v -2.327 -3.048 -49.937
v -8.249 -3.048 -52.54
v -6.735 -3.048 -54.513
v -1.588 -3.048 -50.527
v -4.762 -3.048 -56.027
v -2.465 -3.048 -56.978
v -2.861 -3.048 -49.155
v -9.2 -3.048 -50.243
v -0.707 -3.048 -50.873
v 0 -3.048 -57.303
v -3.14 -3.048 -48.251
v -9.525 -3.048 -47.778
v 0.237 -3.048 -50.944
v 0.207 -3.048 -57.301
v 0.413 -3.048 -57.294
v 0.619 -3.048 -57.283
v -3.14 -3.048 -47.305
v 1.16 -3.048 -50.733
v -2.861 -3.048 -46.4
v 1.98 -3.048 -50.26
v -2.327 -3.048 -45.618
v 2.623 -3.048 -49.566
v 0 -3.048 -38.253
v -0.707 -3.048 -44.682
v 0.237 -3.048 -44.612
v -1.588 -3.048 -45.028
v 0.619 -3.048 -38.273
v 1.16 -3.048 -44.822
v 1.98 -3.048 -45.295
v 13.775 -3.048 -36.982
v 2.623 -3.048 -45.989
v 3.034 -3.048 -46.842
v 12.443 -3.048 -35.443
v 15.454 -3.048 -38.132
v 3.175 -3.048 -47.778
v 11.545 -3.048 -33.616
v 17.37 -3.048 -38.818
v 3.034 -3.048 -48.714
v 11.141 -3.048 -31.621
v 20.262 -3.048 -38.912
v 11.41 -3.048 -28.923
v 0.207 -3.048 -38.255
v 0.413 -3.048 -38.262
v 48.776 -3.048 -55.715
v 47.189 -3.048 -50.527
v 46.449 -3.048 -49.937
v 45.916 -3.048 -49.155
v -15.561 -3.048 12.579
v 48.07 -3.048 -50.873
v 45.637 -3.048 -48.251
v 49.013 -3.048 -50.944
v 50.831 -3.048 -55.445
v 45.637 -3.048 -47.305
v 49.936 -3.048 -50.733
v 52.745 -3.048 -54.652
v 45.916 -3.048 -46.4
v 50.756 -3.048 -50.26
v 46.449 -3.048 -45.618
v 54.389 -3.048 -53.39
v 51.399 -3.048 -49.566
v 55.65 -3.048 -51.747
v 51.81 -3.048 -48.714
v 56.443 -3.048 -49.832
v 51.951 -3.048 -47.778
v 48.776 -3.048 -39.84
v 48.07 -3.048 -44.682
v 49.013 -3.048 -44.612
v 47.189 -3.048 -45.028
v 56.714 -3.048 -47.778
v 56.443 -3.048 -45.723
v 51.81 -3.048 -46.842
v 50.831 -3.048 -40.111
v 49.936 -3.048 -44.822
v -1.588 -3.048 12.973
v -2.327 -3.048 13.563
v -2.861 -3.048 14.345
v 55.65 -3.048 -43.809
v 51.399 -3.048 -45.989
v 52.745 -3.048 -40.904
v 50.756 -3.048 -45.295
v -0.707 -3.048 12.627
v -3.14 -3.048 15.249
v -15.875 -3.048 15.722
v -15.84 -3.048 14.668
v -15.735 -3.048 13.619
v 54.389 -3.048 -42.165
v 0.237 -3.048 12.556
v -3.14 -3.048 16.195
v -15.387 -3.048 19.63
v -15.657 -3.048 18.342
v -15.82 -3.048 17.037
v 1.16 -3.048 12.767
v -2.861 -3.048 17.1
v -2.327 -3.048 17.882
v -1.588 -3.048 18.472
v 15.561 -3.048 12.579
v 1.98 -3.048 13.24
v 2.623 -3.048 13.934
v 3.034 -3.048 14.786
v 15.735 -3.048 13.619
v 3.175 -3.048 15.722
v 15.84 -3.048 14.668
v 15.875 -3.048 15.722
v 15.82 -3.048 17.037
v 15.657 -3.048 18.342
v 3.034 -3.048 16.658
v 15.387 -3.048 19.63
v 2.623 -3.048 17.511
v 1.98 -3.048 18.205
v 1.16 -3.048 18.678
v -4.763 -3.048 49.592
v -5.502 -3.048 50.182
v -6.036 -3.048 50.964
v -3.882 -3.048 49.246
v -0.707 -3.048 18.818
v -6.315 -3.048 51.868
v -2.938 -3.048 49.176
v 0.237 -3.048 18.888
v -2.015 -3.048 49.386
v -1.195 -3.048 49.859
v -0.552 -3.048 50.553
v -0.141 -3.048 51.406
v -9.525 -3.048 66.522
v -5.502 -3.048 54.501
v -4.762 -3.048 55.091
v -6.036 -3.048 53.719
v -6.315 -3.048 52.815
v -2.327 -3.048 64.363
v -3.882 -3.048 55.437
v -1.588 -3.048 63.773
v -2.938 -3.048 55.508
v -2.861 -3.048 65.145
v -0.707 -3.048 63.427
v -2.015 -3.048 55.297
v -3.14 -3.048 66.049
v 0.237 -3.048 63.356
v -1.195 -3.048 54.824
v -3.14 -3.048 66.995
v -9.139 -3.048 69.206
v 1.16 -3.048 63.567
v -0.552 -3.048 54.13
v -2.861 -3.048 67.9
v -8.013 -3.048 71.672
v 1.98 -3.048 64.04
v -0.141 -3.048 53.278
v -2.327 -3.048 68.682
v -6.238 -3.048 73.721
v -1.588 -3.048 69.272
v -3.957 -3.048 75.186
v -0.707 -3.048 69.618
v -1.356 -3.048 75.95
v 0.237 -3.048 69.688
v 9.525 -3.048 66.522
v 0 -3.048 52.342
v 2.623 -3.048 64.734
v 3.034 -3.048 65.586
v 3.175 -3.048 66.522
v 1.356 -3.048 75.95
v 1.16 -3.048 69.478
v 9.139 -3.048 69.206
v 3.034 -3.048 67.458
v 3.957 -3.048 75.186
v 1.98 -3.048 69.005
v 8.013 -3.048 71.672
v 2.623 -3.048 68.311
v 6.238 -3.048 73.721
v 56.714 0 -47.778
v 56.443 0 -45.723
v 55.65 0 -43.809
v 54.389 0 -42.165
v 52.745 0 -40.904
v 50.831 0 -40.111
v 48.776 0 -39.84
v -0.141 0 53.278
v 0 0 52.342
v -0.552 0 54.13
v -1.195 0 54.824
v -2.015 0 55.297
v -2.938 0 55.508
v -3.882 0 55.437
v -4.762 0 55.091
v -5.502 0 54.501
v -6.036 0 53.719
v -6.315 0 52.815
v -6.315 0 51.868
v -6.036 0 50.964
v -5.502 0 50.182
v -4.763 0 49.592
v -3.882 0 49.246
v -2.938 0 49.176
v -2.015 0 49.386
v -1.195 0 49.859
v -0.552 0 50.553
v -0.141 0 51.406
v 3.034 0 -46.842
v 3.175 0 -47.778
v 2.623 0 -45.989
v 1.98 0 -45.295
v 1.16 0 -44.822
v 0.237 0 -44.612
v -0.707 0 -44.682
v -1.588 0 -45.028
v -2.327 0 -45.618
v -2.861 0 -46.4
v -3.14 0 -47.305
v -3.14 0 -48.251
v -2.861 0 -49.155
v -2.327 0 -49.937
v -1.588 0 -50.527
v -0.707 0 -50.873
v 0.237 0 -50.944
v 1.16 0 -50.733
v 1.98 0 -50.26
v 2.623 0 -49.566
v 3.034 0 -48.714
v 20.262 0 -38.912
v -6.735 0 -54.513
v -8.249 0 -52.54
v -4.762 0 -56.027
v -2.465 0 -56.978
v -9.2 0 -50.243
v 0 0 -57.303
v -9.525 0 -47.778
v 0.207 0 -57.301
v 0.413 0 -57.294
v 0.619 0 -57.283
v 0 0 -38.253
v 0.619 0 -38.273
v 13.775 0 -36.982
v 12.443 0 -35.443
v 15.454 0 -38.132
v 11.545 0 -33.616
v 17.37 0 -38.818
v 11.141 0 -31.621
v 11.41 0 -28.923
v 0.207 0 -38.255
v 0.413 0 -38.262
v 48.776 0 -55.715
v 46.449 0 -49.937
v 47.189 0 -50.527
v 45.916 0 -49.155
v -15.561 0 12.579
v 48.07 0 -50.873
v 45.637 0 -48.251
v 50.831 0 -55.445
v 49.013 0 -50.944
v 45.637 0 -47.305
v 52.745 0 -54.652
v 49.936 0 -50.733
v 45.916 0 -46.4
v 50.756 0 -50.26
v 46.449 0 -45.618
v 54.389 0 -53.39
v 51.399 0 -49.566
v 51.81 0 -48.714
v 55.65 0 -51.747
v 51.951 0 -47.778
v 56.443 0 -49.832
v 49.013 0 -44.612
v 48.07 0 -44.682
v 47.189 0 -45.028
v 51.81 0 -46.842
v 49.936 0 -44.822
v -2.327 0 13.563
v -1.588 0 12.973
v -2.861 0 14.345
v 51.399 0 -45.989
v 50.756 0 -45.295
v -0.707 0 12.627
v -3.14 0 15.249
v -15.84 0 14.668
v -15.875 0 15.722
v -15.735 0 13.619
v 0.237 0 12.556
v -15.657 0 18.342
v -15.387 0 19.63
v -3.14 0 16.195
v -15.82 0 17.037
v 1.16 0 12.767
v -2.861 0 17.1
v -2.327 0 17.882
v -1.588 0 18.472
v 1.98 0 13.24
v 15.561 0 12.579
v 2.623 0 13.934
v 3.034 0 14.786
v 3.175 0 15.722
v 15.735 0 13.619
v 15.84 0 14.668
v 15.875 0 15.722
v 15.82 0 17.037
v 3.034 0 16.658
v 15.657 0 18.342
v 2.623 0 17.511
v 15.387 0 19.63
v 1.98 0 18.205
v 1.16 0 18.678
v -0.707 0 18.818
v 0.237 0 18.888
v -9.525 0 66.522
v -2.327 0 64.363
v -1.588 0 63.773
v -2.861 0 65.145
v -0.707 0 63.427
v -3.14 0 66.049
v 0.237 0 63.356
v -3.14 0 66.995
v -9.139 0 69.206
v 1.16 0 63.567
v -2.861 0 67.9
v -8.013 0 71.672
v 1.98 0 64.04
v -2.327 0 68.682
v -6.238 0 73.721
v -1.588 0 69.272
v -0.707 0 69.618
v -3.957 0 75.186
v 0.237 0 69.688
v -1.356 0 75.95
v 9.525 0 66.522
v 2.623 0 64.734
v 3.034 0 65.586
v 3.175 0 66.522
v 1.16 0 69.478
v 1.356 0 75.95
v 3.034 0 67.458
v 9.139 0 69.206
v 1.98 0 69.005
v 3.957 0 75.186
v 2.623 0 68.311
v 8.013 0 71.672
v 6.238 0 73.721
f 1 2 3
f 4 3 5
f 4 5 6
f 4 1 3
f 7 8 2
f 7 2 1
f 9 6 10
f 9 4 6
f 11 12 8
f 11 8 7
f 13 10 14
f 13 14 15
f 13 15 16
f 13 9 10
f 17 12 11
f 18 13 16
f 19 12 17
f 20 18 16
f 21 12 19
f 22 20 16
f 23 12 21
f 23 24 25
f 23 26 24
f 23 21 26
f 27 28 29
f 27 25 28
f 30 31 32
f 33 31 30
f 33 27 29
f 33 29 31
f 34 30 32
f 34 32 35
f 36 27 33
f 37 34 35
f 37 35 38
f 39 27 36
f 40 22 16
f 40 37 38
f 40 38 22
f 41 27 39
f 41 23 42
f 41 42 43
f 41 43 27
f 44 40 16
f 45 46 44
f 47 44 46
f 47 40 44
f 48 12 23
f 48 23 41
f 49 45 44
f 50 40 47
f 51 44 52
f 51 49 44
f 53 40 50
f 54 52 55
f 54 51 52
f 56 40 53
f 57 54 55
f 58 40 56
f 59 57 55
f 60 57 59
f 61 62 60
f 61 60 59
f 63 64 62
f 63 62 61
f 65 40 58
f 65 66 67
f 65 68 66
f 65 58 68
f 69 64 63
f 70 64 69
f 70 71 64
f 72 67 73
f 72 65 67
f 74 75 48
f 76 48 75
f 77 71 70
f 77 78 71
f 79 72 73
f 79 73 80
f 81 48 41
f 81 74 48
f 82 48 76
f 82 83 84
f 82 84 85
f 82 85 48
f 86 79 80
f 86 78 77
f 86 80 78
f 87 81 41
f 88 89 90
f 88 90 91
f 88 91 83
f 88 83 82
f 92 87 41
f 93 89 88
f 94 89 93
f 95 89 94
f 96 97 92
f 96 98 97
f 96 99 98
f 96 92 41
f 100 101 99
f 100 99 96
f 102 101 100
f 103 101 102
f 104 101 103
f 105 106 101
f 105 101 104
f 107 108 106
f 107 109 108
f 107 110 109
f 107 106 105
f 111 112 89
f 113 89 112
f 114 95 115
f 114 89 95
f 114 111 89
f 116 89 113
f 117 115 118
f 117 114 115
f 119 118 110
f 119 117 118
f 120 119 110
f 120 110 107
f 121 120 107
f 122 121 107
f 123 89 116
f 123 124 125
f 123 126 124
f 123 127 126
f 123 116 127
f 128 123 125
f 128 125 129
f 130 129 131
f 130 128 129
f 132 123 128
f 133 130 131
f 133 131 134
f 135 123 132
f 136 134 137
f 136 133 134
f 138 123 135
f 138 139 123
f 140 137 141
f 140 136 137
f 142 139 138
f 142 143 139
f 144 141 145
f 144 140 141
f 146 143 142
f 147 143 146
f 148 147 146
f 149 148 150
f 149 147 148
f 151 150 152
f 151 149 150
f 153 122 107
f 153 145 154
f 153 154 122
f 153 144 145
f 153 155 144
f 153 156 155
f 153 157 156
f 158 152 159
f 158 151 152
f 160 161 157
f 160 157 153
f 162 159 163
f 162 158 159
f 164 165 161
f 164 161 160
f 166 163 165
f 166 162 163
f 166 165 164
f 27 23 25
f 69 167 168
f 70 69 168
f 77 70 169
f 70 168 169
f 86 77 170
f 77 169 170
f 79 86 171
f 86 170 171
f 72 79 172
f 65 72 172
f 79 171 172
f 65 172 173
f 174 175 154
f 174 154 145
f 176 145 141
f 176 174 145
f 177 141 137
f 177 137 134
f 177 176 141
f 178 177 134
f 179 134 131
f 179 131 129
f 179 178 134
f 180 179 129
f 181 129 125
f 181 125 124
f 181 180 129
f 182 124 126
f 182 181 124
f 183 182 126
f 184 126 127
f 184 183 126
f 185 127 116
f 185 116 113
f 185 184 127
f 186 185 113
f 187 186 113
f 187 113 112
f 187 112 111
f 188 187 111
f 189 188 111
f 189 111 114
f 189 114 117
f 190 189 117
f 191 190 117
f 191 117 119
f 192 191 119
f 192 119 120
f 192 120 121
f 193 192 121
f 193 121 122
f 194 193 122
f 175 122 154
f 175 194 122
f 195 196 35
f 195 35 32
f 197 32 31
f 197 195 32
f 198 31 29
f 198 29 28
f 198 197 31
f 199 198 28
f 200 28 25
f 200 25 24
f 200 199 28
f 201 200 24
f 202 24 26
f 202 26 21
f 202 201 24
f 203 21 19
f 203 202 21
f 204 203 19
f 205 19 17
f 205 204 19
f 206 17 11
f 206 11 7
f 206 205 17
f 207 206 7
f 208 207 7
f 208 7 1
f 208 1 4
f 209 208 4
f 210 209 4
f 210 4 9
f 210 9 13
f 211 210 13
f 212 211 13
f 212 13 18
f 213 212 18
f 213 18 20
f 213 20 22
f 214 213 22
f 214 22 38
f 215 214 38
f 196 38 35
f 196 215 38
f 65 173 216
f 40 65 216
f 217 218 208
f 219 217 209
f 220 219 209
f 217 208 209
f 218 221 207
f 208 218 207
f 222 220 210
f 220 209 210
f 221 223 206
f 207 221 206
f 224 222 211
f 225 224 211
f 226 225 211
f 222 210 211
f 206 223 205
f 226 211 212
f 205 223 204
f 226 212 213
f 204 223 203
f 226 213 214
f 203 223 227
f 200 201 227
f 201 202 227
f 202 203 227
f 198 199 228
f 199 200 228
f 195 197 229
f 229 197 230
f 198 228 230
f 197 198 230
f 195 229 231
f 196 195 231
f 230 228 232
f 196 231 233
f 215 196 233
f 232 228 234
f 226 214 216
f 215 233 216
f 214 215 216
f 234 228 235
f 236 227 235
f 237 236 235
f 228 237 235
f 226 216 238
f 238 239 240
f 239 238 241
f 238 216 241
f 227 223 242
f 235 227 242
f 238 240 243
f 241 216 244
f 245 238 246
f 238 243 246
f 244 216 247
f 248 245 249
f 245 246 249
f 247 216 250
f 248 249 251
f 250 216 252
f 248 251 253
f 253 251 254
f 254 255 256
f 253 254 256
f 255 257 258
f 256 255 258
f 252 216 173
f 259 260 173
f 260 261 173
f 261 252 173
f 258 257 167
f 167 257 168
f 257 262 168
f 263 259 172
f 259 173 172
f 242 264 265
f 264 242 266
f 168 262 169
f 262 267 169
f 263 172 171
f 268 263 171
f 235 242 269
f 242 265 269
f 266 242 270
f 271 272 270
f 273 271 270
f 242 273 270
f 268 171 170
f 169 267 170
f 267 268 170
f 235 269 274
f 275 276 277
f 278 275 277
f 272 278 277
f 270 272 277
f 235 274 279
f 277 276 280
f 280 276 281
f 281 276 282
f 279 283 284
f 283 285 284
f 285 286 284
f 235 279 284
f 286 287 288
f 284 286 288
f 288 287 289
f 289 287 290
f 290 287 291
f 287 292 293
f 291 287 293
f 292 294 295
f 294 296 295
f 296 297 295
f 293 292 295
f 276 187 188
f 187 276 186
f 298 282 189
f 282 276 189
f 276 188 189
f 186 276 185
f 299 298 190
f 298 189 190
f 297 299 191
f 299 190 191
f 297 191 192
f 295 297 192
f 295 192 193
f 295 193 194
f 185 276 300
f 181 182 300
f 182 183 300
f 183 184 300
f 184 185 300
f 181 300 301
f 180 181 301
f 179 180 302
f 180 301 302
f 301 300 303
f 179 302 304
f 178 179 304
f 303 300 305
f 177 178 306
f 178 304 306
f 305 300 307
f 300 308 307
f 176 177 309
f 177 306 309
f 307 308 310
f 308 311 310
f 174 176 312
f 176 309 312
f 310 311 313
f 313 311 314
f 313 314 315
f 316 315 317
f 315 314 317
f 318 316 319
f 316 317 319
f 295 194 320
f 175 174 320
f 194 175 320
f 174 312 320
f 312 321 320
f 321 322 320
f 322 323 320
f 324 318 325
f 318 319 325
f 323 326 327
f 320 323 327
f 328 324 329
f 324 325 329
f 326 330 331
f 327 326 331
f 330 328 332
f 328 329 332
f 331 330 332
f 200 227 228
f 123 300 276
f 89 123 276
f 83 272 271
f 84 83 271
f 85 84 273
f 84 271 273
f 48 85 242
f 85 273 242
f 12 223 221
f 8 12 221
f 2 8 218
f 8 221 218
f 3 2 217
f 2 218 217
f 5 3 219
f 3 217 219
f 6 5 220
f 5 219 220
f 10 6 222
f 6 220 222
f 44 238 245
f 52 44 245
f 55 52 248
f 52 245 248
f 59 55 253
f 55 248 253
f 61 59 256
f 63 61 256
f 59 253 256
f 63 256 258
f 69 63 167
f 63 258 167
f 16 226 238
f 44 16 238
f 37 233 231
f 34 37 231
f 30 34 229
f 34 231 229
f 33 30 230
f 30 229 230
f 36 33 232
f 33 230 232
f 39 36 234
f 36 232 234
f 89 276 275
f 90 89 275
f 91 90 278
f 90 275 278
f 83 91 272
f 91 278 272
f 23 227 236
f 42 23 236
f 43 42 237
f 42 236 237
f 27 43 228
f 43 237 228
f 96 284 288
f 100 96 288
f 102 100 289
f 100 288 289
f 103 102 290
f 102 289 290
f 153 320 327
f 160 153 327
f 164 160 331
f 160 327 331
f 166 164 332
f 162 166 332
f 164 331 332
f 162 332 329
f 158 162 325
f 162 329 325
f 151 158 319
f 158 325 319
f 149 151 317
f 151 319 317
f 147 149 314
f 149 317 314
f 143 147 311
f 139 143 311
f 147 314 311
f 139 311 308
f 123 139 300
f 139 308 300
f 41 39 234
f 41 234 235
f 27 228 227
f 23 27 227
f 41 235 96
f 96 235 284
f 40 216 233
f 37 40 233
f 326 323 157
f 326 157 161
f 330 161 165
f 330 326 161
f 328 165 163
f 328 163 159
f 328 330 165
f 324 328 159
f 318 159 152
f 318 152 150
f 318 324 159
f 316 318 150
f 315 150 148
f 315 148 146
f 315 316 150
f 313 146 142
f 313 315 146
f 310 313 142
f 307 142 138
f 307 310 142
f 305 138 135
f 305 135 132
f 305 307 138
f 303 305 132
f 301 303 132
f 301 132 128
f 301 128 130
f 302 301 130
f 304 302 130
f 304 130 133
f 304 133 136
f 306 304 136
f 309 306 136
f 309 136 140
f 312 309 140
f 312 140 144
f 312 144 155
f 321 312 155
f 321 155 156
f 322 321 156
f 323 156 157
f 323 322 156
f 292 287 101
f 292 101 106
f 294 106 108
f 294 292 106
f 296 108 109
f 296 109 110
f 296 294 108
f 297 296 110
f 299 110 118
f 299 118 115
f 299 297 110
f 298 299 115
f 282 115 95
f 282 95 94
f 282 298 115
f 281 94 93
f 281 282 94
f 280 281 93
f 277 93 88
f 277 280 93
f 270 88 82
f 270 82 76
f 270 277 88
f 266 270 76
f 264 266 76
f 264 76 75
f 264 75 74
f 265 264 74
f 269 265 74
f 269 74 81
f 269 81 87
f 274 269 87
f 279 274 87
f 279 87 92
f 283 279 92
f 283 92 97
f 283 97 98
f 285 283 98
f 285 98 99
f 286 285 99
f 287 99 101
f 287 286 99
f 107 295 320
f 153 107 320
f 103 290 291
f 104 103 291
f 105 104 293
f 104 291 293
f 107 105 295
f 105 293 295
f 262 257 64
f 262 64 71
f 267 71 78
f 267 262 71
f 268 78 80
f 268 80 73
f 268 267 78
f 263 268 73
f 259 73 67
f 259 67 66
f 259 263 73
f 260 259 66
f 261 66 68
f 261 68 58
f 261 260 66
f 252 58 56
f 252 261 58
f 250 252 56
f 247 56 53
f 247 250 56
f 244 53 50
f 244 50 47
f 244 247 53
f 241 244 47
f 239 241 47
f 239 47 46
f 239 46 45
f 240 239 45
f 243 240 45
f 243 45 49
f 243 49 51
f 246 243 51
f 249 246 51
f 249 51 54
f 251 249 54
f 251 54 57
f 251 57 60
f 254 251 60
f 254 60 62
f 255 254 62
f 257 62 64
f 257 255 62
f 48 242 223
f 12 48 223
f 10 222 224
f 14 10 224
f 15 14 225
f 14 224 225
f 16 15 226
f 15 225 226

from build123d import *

# Parameters (mm, degrees)
F0_R     = 3.175
F1_DEPTH = 3.048


with BuildPart() as f1:
    # F0 (on Front) → F1 (new body)
    with BuildSketch(Plane.XZ):
        with BuildLine():
            ThreePointArc((-9.525, 66.5221907973), (0, 56.9971907973), (9.525, 66.5221907973))
            ThreePointArc((9.525, 66.5221907973), (0, 76.0471907973), (-9.525, 66.5221907973))
        make_face()
        with Locations((0, 66.5221907973)):
            Circle(F0_R, mode=Mode.SUBTRACT)
        with BuildLine():
            Line((15.3865384615, 19.629883105), (9.525, 66.5221907973))
            ThreePointArc((9.525, 66.5221907973), (0, 56.9971907973), (-9.525, 66.5221907973))
            Line((-9.525, 66.5221907973), (-15.3865384615, 19.629883105))
            ThreePointArc((-15.3865384615, 19.629883105), (0, 31.5971907973), (15.3865384615, 19.629883105))
        make_face()
        with Locations((-3.175, 52.341658622)):
            Circle(F0_R, mode=Mode.SUBTRACT)
        with BuildLine():
            Line((15.875, 15.7221907973), (15.3865384615, 19.629883105))
            ThreePointArc((15.3865384615, 19.629883105), (0, 31.5971907973), (-15.3865384615, 19.629883105))
            Line((-15.3865384615, 19.629883105), (-15.875, 15.7221907973))
            Line((-15.875, 15.7221907973), (-15.5606435644, 12.5786264409))
            ThreePointArc((-15.5606435644, 12.5786264409), (0, -0.1528092027), (15.5606435644, 12.5786264409))
            Line((15.5606435644, 12.5786264409), (15.875, 15.7221907973))
        make_face()
        with Locations((0, 15.7221907973)):
            Circle(F0_R, mode=Mode.SUBTRACT)
        with BuildLine():
            ThreePointArc((15.875, 15.7221907973), (15.7524112928, 17.6912422089), (15.3865384615, 19.629883105))
            Line((15.3865384615, 19.629883105), (15.875, 15.7221907973))
        make_face()
        with BuildLine():
            Line((-15.875, 15.7221907973), (-15.3865384615, 19.629883105))
            ThreePointArc((-15.3865384615, 19.629883105), (-15.7524112928, 17.6912422089), (-15.875, 15.7221907973))
        make_face()
        with BuildLine():
            ThreePointArc((15.5606435644, 12.5786264409), (15.7962153946, 14.1425692579), (15.875, 15.7221907973))
            Line((15.875, 15.7221907973), (15.5606435644, 12.5786264409))
        make_face()
        with BuildLine():
            Line((-15.5606435644, 12.5786264409), (-15.875, 15.7221907973))
            ThreePointArc((-15.875, 15.7221907973), (-15.7962153946, 14.1425692579), (-15.5606435644, 12.5786264409))
        make_face()
        with BuildLine():
            Line((11.4104326497, -28.9234827055), (15.5606435644, 12.5786264409))
            ThreePointArc((15.5606435644, 12.5786264409), (0, -0.1528092027), (-15.5606435644, 12.5786264409))
            Line((-15.5606435644, 12.5786264409), (-9.525, -47.7778092027))
            ThreePointArc((-9.525, -47.7778092027), (-6.7351920908, -41.0426171119), (0, -38.2528092027))
            ThreePointArc((0, -38.2528092027), (0.309842749, -38.2578500394), (0.6193575471, -38.272967214))
            Line((0.6193575471, -38.272967214), (10.4435098772, -38.5927104307))
            Line((10.4435098772, -38.5927104307), (11.1406480746, -31.6213284562))
            ThreePointArc((11.1406480746, -31.6213284562), (11.1596842937, -30.260819974), (11.4104326497, -28.9234827055))
        make_face()
        with BuildLine():
            Line((11.1406480746, -31.6213284562), (11.4104326497, -28.9234827055))
            ThreePointArc((11.4104326497, -28.9234827055), (11.1596842937, -30.260819974), (11.1406480746, -31.6213284562))
        make_face()
        with BuildLine():
            ThreePointArc((0, -38.2528092027), (-6.7351920908, -41.0426171119), (-9.525, -47.7778092027))
            ThreePointArc((-9.525, -47.7778092027), (-6.7351920908, -54.5130012935), (0, -57.3028092027))
            Line((0, -57.3028092027), (0.6193575471, -57.2826511913))
            ThreePointArc((0.6193575471, -57.2826511913), (6.9507195899, -54.2903449747), (9.525, -47.7778092027))
            ThreePointArc((9.525, -47.7778092027), (6.9507195899, -41.2652734306), (0.6193575471, -38.272967214))
            Line((0.6193575471, -38.272967214), (0, -38.2528092027))
        make_face()
        with Locations((0, -47.7778092027)):
            Circle(F0_R, mode=Mode.SUBTRACT)
        with BuildLine():
            ThreePointArc((17.370144363, -38.8181491572), (13.0593477477, -36.2550264457), (11.1406480746, -31.6213284562))
            Line((11.1406480746, -31.6213284562), (10.4435098772, -38.5927104307))
            Line((10.4435098772, -38.5927104307), (17.370144363, -38.8181491572))
        make_face()
        with BuildLine():
            Line((0.6193575471, -57.2826511913), (0, -57.3028092027))
            ThreePointArc((0, -57.3028092027), (0.309842749, -57.297768366), (0.6193575471, -57.2826511913))
        make_face()
        with BuildLine():
            Line((17.370144363, -38.8181491572), (10.4435098772, -38.5927104307))
            Line((10.4435098772, -38.5927104307), (9.525, -47.7778092027))
            ThreePointArc((9.525, -47.7778092027), (6.9507195899, -54.2903449747), (0.6193575471, -57.2826511913))
            Line((0.6193575471, -57.2826511913), (48.7761460245, -55.7153092027))
            ThreePointArc((48.7761460245, -55.7153092027), (40.8386460245, -47.7778092027), (48.7761460245, -39.8403092027))
            Line((48.7761460245, -39.8403092027), (20.2621190411, -38.9122732358))
            ThreePointArc((20.2621190411, -38.9122732358), (18.8118135488, -38.9978870226), (17.370144363, -38.8181491572))
        make_face()
        with BuildLine():
            Line((20.2621190411, -38.9122732358), (17.370144363, -38.8181491572))
            ThreePointArc((17.370144363, -38.8181491572), (18.8118135488, -38.9978870226), (20.2621190411, -38.9122732358))
        make_face()
        with BuildLine():
            ThreePointArc((48.7761460245, -39.8403092027), (40.8386460245, -47.7778092027), (48.7761460245, -55.7153092027))
            ThreePointArc((48.7761460245, -55.7153092027), (54.3888061001, -53.3904692783), (56.7136460245, -47.7778092027))
            ThreePointArc((56.7136460245, -47.7778092027), (54.3888061001, -42.165149127), (48.7761460245, -39.8403092027))
        make_face()
        with Locations((48.7761460245, -47.7778092027)):
            Circle(F0_R, mode=Mode.SUBTRACT)
        with BuildLine():
            Line((9.525, -47.7778092027), (10.4435098772, -38.5927104307))
            Line((10.4435098772, -38.5927104307), (0.6193575471, -38.272967214))
            ThreePointArc((0.6193575471, -38.272967214), (6.9507195899, -41.2652734306), (9.525, -47.7778092027))
        make_face()
    extrude(amount=F1_DEPTH)


solid = f1.part
